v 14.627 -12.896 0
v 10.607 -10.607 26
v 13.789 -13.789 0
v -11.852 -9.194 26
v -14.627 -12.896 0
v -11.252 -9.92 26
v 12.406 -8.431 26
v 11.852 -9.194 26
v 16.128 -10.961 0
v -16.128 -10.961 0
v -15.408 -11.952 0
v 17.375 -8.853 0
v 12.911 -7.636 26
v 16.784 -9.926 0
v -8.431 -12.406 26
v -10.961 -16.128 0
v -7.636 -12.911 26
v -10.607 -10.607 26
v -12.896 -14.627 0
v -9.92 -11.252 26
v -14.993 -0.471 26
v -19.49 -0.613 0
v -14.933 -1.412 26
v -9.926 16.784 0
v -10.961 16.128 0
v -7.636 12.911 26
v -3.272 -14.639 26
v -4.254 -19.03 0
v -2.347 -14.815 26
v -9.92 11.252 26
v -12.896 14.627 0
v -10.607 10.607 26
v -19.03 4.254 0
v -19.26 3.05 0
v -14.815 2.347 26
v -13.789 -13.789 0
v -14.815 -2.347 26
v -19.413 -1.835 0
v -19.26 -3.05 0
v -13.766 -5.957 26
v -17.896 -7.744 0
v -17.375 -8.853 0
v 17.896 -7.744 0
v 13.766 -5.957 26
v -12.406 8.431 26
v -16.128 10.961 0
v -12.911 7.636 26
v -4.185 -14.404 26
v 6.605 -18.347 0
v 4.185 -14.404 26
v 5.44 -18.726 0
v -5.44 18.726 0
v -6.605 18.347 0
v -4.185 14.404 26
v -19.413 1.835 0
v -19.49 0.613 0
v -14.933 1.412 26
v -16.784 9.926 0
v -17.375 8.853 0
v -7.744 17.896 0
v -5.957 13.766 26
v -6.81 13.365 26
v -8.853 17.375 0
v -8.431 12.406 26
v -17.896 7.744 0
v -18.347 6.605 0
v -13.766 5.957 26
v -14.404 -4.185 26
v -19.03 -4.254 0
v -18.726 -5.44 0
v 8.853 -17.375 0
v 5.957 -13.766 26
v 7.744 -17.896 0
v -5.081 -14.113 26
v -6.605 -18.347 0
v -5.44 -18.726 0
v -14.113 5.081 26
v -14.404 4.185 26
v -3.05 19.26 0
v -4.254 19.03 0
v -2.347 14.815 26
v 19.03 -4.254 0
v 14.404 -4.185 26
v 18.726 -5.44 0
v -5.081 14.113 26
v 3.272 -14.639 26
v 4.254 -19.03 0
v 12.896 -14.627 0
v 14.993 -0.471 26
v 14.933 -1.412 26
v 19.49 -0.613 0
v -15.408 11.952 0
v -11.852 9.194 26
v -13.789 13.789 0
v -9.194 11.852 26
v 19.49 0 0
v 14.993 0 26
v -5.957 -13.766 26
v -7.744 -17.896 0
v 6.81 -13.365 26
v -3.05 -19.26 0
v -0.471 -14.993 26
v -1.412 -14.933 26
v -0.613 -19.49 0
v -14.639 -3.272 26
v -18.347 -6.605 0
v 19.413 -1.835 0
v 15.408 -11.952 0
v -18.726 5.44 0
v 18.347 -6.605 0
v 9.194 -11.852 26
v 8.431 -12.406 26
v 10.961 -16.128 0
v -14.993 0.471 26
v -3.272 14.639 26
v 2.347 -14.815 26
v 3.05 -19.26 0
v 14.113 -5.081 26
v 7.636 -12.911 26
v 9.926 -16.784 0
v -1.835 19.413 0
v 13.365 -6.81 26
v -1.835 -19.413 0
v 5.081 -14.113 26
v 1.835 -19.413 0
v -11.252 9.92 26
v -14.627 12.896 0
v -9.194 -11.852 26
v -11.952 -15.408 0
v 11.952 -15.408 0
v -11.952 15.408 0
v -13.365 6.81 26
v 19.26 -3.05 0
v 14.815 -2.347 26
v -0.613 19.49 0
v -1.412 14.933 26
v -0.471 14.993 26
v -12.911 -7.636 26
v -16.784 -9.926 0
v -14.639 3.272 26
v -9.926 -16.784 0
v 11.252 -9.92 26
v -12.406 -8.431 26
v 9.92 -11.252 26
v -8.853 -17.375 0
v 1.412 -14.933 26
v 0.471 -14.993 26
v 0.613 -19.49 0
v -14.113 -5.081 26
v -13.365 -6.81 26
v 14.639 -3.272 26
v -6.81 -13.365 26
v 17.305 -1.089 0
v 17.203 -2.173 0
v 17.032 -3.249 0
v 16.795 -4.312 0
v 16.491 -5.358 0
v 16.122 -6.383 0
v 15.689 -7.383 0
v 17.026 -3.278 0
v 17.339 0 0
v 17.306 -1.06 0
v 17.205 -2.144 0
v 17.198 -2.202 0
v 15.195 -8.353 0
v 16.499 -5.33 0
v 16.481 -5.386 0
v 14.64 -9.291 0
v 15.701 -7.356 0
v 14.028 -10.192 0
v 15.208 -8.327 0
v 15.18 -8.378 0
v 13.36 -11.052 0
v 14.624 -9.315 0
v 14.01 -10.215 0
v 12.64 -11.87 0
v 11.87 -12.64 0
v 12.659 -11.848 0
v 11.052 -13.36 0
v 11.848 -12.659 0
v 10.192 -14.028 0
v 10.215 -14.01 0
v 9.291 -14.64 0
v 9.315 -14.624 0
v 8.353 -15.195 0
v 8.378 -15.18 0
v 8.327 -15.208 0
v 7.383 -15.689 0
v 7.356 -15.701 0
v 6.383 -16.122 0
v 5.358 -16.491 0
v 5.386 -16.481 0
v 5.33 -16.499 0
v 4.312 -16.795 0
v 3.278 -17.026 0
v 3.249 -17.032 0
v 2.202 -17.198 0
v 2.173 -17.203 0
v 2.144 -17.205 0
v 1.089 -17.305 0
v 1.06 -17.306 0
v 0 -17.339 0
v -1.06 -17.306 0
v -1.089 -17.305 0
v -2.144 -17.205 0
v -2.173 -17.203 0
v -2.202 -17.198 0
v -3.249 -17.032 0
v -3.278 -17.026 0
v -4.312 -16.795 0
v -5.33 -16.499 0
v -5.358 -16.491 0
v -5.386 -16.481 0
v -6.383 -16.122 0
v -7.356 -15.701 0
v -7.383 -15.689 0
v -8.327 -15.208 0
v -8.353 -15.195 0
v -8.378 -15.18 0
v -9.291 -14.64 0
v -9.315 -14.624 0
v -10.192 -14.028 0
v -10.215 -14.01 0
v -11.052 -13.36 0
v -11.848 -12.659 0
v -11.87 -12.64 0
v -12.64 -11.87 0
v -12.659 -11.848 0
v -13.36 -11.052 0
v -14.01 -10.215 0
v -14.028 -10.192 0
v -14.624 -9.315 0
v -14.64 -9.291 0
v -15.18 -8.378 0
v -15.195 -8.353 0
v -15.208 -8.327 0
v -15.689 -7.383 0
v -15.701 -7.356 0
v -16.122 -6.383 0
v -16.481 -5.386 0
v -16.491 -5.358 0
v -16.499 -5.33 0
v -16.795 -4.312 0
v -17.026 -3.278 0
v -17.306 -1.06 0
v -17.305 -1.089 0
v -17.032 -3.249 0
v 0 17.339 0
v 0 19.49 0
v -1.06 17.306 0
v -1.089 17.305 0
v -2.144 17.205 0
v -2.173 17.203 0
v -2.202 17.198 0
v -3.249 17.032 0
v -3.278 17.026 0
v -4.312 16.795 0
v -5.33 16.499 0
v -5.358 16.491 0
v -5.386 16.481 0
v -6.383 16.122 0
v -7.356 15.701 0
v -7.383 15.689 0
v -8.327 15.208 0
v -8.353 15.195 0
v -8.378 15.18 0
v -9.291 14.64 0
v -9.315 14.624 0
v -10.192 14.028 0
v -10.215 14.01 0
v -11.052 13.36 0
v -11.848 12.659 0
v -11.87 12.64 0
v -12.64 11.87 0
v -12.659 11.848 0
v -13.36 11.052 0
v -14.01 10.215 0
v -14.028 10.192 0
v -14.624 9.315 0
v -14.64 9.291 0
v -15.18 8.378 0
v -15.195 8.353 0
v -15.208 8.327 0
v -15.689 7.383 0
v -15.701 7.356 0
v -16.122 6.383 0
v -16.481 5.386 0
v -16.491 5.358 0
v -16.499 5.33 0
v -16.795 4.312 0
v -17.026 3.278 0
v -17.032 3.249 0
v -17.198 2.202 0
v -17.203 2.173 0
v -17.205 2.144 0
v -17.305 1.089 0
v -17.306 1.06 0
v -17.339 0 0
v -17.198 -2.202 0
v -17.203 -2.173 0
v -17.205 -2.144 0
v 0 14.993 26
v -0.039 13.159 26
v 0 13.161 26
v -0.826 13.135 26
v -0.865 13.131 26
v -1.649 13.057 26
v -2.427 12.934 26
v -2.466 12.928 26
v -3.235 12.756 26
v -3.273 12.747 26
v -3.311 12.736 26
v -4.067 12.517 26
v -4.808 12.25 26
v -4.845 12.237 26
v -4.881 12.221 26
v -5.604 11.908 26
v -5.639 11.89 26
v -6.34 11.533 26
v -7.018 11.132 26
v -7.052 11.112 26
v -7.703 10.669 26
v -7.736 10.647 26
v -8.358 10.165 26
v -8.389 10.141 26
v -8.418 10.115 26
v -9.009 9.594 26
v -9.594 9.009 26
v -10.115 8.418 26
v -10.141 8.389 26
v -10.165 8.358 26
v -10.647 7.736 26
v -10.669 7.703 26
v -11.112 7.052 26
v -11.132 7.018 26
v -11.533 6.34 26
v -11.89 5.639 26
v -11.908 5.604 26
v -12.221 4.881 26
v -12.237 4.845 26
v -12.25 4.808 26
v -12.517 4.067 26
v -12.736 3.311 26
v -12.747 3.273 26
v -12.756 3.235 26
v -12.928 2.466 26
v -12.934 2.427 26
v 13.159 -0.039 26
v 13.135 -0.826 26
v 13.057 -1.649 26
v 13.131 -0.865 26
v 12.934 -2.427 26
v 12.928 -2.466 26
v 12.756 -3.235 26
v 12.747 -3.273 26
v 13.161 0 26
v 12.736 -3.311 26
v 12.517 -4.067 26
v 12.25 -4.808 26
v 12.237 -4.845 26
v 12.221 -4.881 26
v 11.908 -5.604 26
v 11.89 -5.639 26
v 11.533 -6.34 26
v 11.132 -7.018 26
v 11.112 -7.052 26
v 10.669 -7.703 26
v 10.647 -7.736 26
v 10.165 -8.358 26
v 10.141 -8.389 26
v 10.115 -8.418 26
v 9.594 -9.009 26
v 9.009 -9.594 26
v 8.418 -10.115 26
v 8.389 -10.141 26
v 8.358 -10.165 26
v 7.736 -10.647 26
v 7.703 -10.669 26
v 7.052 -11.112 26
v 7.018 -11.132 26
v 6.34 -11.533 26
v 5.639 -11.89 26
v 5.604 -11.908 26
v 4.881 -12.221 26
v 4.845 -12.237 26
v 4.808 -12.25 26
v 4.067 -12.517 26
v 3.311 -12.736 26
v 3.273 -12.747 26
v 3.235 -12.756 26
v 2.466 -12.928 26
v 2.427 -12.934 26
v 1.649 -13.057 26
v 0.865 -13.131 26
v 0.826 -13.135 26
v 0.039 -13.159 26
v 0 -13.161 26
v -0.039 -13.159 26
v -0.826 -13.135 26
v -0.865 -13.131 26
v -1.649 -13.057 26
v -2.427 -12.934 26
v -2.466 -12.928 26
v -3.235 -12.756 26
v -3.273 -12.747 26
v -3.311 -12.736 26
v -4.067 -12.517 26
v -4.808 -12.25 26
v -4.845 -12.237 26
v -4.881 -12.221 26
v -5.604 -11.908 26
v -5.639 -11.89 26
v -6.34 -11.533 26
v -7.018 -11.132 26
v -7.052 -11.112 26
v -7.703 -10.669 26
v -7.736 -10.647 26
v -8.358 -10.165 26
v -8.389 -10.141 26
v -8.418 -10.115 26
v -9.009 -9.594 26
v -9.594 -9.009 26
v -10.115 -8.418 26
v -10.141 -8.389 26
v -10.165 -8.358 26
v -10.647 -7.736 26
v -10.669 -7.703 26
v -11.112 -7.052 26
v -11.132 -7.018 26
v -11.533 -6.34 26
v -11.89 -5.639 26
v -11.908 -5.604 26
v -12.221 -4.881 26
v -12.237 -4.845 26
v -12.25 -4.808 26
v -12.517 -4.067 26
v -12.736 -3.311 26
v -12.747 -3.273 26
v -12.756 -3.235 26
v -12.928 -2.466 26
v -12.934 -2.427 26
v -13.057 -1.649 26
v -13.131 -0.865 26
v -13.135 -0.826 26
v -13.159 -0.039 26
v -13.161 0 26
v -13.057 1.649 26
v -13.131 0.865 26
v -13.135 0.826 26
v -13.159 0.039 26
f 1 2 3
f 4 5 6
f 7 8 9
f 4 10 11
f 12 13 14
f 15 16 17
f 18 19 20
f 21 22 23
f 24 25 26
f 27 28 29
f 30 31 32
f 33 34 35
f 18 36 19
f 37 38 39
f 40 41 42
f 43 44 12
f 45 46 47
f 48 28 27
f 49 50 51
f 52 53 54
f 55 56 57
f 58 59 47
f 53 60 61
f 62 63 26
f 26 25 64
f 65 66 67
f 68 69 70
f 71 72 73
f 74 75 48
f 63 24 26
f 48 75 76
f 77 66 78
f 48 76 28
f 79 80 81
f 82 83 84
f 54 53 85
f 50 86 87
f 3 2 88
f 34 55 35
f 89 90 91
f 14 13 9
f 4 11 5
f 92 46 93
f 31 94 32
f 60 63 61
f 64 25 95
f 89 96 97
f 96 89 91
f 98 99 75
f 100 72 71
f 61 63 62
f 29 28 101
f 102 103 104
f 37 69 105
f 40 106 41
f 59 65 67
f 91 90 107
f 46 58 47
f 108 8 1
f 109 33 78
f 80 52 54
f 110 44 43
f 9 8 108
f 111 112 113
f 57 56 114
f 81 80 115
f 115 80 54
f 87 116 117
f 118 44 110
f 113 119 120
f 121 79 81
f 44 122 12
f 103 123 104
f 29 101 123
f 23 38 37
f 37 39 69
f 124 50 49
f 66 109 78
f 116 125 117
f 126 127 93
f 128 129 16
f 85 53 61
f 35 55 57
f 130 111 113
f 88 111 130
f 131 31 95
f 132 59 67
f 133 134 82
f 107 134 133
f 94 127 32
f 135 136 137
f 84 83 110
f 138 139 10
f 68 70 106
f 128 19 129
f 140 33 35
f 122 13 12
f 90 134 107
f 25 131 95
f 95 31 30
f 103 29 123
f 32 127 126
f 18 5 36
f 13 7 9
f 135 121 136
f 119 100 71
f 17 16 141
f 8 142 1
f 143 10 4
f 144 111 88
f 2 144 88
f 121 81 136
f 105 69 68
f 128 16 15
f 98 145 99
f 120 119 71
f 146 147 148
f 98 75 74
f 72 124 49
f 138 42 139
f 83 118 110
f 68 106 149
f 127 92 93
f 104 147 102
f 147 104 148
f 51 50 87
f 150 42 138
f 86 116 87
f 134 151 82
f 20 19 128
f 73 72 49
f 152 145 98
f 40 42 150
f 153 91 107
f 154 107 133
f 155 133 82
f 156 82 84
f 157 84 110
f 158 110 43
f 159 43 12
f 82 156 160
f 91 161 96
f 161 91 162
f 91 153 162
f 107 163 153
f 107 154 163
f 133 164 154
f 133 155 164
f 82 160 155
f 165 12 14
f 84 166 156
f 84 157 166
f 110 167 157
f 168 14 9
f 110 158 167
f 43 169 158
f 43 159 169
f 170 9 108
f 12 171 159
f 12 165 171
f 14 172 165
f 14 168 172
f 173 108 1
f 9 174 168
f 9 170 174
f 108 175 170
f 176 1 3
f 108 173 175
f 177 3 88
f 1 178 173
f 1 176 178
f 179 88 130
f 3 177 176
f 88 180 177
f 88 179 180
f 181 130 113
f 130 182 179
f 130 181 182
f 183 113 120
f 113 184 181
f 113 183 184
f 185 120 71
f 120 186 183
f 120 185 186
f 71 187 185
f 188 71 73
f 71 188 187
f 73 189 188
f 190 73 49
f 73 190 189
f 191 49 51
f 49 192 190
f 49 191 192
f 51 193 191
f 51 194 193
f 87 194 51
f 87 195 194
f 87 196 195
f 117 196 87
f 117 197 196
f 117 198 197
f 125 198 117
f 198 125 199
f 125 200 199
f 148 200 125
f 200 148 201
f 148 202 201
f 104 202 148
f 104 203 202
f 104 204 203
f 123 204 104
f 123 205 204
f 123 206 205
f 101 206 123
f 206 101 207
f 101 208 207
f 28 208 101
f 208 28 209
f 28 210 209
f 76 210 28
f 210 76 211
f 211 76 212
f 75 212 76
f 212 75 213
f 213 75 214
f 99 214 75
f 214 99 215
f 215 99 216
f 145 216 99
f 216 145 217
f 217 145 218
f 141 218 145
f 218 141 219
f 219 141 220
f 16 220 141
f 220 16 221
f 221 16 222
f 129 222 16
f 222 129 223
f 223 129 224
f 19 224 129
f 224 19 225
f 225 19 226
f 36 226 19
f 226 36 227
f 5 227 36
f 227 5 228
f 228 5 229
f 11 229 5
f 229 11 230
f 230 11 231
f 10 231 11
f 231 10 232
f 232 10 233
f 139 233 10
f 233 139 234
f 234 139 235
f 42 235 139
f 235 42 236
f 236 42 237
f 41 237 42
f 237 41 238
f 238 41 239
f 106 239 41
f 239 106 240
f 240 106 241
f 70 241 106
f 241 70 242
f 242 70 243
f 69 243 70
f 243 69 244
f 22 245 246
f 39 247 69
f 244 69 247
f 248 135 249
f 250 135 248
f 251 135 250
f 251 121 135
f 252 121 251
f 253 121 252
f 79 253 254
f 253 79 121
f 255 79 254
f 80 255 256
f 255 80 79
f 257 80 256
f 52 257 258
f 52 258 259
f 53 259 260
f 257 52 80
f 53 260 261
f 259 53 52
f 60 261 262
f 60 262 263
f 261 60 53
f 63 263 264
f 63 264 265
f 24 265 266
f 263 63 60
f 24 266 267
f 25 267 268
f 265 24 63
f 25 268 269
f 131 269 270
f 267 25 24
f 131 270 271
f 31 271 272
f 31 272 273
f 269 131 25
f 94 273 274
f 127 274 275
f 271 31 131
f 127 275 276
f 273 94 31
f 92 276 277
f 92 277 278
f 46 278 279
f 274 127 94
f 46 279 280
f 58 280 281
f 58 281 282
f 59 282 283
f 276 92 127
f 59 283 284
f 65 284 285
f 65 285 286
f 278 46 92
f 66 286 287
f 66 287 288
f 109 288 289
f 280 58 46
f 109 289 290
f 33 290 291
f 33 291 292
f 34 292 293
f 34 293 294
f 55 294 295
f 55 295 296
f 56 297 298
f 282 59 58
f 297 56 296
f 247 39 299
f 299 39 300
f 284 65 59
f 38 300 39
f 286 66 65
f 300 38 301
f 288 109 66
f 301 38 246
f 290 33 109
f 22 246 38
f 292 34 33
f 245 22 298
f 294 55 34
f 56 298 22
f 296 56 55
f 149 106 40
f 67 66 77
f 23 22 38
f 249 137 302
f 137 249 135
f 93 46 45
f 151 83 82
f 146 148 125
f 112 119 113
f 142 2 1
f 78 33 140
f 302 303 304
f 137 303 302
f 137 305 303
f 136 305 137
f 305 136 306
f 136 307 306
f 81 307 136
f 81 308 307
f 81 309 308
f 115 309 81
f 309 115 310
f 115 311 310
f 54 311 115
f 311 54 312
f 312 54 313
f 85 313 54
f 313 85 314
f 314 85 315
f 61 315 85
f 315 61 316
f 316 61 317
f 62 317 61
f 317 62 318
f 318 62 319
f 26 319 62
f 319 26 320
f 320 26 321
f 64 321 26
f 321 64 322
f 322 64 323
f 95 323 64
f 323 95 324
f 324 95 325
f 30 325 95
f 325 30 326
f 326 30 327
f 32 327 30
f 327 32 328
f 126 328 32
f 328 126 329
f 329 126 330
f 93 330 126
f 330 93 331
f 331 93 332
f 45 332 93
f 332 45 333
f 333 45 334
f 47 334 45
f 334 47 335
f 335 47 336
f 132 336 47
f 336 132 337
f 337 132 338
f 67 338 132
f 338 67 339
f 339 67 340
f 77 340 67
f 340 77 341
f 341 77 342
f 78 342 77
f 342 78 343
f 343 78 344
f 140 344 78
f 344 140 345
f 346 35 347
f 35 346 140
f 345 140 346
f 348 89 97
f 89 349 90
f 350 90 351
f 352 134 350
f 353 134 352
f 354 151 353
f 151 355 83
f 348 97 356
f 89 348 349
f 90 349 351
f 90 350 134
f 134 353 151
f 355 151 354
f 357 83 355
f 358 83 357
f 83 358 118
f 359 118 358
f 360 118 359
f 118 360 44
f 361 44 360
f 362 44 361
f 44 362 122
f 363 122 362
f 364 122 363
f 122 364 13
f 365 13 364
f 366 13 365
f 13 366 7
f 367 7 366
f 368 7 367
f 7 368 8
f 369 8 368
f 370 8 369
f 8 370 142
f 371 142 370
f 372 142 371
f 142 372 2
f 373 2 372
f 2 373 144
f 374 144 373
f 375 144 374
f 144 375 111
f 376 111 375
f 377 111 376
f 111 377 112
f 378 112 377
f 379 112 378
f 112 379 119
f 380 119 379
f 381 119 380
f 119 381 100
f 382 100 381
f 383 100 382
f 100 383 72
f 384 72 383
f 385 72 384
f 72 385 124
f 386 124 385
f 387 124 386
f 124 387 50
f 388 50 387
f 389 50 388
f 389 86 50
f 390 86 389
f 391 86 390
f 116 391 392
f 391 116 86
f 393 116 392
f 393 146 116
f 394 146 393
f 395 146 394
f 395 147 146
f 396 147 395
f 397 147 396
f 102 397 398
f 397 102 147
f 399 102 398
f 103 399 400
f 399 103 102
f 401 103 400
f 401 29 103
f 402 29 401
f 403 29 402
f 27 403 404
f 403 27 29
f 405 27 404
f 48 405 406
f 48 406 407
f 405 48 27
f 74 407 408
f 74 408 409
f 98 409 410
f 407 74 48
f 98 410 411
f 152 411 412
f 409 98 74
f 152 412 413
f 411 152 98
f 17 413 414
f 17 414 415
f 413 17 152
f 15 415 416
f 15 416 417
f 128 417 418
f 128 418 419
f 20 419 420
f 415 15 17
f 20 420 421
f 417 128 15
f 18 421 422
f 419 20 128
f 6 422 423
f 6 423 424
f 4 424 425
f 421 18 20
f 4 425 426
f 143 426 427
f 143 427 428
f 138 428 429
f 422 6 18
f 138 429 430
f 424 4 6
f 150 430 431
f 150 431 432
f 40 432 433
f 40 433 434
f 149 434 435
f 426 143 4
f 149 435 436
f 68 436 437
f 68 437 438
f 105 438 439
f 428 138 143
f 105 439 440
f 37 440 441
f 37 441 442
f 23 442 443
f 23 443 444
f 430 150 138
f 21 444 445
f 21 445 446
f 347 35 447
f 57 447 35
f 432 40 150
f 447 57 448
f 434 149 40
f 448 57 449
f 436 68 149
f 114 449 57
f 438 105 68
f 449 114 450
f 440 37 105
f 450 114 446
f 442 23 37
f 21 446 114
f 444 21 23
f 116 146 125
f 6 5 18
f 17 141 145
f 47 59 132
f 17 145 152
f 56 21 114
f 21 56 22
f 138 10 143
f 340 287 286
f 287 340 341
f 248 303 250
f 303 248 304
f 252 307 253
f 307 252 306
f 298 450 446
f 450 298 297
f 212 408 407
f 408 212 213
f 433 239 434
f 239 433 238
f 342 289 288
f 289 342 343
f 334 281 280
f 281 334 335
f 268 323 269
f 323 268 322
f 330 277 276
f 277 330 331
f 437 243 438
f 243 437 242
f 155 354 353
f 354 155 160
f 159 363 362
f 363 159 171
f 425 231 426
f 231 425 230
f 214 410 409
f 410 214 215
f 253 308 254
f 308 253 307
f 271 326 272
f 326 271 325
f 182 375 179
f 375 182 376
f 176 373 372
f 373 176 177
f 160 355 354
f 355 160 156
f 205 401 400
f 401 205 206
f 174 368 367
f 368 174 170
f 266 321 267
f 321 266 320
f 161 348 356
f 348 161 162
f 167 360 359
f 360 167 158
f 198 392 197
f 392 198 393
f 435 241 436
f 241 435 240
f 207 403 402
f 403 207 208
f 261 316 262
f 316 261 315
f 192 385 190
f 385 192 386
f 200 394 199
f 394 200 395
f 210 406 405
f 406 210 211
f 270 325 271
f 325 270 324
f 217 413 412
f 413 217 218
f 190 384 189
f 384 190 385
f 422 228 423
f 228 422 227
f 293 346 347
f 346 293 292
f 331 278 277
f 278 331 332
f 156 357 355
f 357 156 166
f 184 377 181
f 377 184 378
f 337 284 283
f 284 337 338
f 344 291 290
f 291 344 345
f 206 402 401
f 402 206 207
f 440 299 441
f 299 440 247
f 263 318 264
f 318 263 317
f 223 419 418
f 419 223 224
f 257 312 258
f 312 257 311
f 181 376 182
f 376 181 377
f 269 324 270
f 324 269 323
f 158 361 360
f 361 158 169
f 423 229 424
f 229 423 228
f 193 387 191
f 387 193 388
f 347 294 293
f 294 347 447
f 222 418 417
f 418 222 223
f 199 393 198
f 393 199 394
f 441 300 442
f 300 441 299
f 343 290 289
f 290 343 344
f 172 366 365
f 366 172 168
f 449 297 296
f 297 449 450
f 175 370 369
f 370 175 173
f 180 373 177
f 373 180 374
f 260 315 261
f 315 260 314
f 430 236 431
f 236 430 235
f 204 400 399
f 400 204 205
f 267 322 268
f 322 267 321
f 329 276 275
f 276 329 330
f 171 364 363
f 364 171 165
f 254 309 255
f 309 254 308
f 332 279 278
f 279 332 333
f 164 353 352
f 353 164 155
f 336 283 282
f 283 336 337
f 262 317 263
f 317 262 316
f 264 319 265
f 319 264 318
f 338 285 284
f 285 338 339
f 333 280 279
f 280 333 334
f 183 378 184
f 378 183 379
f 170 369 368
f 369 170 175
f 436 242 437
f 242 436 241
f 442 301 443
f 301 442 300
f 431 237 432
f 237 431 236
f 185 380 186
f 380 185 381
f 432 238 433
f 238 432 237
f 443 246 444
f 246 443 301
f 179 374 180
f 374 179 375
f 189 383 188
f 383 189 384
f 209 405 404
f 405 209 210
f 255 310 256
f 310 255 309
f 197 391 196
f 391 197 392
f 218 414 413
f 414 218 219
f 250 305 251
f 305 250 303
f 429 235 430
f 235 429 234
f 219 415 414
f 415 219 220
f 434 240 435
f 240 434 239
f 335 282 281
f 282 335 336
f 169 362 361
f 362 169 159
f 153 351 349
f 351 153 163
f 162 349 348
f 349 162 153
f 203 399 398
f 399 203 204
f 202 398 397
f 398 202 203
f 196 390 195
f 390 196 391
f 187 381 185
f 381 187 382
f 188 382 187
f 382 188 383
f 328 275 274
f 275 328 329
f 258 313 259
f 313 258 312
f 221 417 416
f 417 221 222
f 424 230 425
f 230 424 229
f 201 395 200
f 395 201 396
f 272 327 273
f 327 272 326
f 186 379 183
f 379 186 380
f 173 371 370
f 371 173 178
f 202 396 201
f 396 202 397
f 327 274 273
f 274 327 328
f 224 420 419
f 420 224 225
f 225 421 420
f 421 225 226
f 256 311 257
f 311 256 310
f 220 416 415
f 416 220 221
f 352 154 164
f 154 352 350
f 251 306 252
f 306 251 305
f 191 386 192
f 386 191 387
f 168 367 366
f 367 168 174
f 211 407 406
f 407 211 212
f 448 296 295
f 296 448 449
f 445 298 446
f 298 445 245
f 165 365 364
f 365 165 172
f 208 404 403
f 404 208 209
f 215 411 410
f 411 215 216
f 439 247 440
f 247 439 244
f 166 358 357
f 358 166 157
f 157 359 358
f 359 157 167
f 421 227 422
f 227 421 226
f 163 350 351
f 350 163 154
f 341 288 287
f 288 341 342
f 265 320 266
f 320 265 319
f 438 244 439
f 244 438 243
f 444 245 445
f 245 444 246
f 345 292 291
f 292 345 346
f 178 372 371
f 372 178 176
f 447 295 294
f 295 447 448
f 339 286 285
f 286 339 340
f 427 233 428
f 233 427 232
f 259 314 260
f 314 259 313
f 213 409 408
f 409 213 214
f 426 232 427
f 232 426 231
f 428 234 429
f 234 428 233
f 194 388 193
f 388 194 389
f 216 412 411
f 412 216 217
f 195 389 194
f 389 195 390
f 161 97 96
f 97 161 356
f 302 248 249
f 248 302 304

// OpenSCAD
name = "I";
bottle_type = "din-6075"; // [din-6075:"DIN 6075 (Club Mate, most beers)", din-6198:"DIN 6198 (Euro2)", din-6199:"DIN 6199 (Steinie)", longneck:"Longneck (Fritz Cola)", custom:Custom]
logo = "icons/Club_mate_logo.dxf";
name_font = "write_lib/orbitron.dxf";
// thickness of the clip
width=2;
// the back in the back of the clip
gap=90;
// only applies with bottle_type=custom
upper_radius=13;
// only applies with bottle_type=custom
lower_radius=22.5;
// only applies with bottle_type=custom
height=26;

$fn = 100;

include <write_lib/Write.scad>

/**
 * Creates one instance of a bottle clip name tag. The default values are
 * suitable for 0.5l Club Mate bottles (and similar bottles). By default, logo
 * and text are placed on the name tag so they both share half the height. If
 * there is no logo, the text uses the total height instead.
 * Parameters:
 * ru: the radius on the upper side of the clip
 * rl: the radius on the lower side of the clip
 * ht: the height of the clip
 * width: the thickness of the wall. Values near 2.5 usually result in a good
 *	clippiness for PLA prints.
 * name: the name that is printed on your name tag. For the default ru/rt/ht
 *	values, this string should not exceed 18 characters to fit on the name tag.
 * gap: width of the opening gap, in degrees. For rigid materials this value
 *  usually needs to be near 180 (but if you set it to >= 180, you won't have
 *  anything left for holding the clip on the bottle). For flexible materials
 *  like Ninjaflex, choose something near 0. For springy materials like PLA or
 *  ABS, 90 has proven to be a good value.
 * logo: the path to a DXF file representing a logo that should be put above
 *	the name. Logo files should be no larger than 50 units in height and should
 *	be centered on the point (25,25). Also all units in the DXF file should be
 *	in mm. This parameter can be empty; in this case, the text uses the total
 *	height of the name tag.
 * font: the path to a font for Write.scad.
 */
module bottle_clip(ru=13, rl=17.5, ht=26, width=2.5, name="", gap=90,
		logo="thing-logos/stratum0-lowres.dxf", font="orbitron.dxf") {
    
	e=100;  // should be big enough, used for the outer boundary of the text/logo

	difference() {
		rotate([0,0,-45]) union() {
			// main cylinder
			cylinder(r1=rl+width, r2=ru+width, h=ht);
			// text and logo
			if(logo == "") {
				writecylinder(name, [0,0,3], rl+0.5, ht/13*7, h=ht/13*8, t=max(rl,ru),
					font=font);
			} else {
				writecylinder(name, [0,0,0], rl+0.5, ht/13*7, h=ht/13*4, t=max(rl,ru),
					font=font);
					
				translate([0,0,ht*3/4-0.1])
					rotate([90,0,0])
					scale([ht/100,ht/100,1])
					translate([-25,-25,0.5])
					linear_extrude(height=max(ru,rl)*2)
					import(logo);
					
			}
		}
		// inner cylinder which is substracted
		translate([0,0,-1])
			cylinder(r1=rl, r2=ru, h=ht+2);
		// outer cylinder which is substracted, so the text and the logo end
		// somewhere on the outside ;-)
		difference () {
			cylinder(r1=rl+e, r2=ru+e, h=ht);
			translate([0,0,-1])
				// Note: bottom edges of characters are hard to print when character
				// depth is > 0.7
				cylinder(r1=rl+width+0.7, r2=ru+width+0.7, h=ht+2);
		}

		// finally, substract an equilateral triangle as a gap so we can clip it to
		// the bottle
		gap_x=50*sin(45-gap/2);
		gap_y=50*cos(45-gap/2);
		translate([0,0,-1])
			linear_extrude(height=50)
			polygon(points=[[0,0], [gap_x, gap_y], [50,50], [gap_y, gap_x]]);
	}
}


if(bottle_type == "din-6198"){
    bottle_clip(ru=13, rl=22.5, ht=26, width=width, name=name, gap=gap, logo=logo, font=name_font);
}
if(bottle_type == "din-6075"){
    bottle_clip(ru=13, rl=17.5, ht=26, width=width, name=name, gap=gap, logo=logo, font=name_font);
}
else if(bottle_type == "din-6199"){
    bottle_clip(ru=13, rl=17.5, ht=13, width=width, name=name, gap=gap, logo=logo, font=name_font);
}
else if(bottle_type == "longneck"){
    bottle_clip(ru=13, rl=15, ht=26, width=width, name=name, gap=gap, logo=logo, font=name_font);
}
else {
    bottle_clip(ru=upper_radius, rl=lower_radius, ht=height, width=width, name=name, gap=gap, logo=logo, font=name_font);
}
